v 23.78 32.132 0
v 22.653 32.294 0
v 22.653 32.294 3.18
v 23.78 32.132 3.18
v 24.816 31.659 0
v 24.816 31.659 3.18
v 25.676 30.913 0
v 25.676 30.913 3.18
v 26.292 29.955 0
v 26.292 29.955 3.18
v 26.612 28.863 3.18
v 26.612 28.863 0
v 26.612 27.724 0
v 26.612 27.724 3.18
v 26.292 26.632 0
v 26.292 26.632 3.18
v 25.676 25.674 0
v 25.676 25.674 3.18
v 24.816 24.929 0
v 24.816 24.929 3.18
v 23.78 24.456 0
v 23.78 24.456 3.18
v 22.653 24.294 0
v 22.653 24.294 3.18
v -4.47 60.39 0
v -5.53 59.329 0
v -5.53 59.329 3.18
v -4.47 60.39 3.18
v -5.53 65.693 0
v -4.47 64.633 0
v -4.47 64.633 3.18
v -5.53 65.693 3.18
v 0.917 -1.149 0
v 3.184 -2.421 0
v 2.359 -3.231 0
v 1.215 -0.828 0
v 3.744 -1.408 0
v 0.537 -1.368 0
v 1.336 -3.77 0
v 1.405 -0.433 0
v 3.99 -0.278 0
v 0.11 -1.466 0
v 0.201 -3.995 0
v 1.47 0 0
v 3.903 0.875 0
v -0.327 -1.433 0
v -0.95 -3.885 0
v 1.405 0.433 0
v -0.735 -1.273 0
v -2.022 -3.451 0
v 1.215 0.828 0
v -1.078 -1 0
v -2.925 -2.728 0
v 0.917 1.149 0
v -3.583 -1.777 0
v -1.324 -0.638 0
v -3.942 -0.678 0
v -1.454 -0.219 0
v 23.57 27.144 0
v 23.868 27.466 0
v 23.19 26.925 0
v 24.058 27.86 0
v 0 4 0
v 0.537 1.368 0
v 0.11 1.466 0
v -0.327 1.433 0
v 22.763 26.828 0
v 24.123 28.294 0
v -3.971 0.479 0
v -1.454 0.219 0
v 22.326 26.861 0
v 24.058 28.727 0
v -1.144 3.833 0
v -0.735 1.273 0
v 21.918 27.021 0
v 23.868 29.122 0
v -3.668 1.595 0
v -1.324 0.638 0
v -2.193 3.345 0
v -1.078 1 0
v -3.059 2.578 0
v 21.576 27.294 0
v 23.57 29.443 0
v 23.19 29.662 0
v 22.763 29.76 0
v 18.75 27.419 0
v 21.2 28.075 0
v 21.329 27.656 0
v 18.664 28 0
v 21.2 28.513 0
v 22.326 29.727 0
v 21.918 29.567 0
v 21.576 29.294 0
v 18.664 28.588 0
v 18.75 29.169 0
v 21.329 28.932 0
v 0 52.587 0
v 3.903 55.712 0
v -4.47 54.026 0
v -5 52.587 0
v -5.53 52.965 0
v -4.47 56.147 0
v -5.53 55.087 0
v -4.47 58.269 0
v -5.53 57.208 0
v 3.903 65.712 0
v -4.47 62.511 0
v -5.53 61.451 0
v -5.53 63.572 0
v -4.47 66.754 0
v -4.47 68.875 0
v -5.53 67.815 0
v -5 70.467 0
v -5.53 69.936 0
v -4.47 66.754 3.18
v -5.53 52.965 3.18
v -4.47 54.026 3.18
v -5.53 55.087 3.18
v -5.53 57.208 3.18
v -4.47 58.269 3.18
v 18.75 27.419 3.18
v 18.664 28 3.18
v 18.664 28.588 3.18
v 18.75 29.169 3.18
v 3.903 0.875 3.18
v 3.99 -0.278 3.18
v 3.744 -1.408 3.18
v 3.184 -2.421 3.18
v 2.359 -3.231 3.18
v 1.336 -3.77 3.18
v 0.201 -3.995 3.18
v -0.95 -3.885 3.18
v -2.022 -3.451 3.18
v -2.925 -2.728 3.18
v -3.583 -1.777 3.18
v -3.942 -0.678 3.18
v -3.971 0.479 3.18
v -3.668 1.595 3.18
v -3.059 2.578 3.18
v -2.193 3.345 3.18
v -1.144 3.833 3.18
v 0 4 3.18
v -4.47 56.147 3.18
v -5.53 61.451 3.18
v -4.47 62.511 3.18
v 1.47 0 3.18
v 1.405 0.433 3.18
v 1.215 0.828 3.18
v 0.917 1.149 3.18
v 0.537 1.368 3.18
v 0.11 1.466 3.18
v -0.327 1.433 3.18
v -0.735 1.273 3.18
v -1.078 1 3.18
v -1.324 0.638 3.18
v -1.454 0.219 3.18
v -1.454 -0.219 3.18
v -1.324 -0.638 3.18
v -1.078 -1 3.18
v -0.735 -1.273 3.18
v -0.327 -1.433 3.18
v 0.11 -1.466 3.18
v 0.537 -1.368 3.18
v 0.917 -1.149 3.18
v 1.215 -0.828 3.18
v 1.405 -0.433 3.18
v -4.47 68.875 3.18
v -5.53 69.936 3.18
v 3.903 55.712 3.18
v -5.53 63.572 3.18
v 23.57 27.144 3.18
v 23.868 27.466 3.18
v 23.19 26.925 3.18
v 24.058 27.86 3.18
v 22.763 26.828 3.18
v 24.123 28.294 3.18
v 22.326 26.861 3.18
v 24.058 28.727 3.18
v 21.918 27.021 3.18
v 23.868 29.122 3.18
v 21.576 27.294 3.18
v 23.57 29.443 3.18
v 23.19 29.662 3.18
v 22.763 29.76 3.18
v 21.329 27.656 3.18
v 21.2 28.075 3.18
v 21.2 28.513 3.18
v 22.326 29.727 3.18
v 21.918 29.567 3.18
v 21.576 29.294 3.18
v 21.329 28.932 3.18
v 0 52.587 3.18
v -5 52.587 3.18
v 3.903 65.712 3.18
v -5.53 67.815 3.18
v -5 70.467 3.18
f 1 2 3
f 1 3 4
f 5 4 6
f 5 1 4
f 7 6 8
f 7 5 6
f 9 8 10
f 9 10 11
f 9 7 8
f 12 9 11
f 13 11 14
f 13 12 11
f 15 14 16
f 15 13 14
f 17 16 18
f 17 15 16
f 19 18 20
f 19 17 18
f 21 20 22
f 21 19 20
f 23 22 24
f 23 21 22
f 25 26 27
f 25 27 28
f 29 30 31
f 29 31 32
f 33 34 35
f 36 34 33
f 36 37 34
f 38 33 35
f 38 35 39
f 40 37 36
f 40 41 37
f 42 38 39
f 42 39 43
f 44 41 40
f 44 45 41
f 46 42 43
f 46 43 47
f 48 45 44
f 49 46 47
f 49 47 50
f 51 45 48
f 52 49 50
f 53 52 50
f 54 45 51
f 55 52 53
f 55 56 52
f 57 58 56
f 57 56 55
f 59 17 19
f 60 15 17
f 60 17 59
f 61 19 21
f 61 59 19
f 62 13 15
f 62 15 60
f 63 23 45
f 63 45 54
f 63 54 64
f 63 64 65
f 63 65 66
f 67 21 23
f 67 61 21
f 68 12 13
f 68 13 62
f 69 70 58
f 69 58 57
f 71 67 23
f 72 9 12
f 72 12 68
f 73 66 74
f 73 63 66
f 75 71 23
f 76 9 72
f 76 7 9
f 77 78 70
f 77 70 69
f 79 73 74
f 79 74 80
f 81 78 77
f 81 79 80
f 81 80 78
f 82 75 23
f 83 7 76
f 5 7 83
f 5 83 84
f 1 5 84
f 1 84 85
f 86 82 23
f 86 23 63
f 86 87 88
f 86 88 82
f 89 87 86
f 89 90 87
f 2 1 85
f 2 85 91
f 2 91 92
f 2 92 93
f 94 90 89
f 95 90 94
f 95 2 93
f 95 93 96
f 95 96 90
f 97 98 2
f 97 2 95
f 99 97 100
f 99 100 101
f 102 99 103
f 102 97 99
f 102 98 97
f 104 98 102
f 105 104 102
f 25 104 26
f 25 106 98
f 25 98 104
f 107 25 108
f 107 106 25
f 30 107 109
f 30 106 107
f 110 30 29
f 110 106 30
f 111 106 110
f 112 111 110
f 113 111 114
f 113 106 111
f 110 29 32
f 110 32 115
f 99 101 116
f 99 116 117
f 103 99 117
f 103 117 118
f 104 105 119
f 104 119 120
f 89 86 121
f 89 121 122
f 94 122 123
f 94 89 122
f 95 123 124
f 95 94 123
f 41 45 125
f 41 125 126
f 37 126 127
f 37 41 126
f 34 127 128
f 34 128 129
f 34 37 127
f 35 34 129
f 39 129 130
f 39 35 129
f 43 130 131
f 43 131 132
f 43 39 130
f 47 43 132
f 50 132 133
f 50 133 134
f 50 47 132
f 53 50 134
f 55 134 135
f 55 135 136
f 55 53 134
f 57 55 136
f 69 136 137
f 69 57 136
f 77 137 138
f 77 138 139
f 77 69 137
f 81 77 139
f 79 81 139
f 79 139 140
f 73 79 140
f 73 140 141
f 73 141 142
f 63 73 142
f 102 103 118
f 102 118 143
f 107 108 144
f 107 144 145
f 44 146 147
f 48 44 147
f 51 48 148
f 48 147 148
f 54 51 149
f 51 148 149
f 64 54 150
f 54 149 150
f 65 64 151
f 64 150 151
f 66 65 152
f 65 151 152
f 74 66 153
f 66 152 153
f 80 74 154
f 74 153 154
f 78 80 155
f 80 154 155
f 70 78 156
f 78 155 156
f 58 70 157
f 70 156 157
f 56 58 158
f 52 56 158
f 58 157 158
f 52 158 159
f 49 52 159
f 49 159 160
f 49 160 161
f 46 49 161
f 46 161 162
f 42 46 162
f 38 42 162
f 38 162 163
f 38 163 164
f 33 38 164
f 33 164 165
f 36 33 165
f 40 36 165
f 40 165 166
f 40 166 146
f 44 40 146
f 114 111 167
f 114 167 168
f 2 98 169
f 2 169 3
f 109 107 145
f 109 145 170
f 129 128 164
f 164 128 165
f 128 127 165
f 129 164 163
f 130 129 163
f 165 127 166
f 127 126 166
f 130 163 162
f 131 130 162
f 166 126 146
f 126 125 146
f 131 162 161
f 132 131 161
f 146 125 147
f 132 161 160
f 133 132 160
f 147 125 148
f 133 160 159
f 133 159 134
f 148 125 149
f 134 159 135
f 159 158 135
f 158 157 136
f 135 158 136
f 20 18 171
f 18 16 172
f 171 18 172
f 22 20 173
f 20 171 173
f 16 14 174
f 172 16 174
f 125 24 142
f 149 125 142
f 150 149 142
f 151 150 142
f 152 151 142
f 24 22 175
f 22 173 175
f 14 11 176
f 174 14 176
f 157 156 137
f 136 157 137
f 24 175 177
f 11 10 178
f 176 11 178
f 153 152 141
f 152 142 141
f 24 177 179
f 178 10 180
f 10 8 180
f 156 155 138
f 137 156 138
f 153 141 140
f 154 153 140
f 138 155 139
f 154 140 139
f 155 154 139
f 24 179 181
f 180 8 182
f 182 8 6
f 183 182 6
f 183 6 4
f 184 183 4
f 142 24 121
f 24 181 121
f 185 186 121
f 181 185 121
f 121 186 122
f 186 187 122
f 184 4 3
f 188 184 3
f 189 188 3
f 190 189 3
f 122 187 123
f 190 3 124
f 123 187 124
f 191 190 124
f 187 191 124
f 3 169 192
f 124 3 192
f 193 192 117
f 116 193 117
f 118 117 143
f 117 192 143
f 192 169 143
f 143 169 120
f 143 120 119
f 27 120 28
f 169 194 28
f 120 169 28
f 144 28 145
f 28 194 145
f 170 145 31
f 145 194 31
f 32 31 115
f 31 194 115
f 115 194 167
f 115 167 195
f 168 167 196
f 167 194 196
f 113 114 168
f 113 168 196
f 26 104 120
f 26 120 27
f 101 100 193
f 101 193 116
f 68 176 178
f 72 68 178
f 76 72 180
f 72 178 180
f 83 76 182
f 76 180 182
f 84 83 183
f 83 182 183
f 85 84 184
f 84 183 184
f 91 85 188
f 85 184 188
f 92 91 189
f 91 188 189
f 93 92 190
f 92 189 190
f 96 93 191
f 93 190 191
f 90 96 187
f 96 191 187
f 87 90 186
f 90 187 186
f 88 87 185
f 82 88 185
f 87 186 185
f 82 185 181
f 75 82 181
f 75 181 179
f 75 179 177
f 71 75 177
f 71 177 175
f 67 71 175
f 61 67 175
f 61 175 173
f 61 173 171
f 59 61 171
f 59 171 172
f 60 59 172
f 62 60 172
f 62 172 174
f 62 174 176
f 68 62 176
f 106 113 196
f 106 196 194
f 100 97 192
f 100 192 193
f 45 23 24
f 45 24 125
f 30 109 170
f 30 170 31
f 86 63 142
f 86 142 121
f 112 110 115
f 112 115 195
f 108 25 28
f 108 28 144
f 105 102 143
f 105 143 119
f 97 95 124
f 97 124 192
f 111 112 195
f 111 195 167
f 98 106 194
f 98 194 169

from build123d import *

# Parameters (mm, degrees)
BOSS_EXTRUDE1_DEPTH = 3.18
SKETCH2_R           = 1.47
CUT_EXTRUDE1_DEPTH  = 76.406636354


with BuildPart() as part:
    # Sketch1 → Boss-Extrude1 (new body)
    with BuildSketch(Plane.XY):
        with BuildLine():
            Line((0, 4), (18.75, 27.418742494))
            ThreePointArc((18.75, 27.418742494), (18.653123749, 28.293742494), (18.75, 29.168742494))
            Line((18.75, 29.168742494), (0, 52.587484988))
            Line((0, 52.587484988), (-5, 52.587484988))
            Line((-5, 52.587484988), (-5.530330085, 52.96527181))
            Line((-5.530330085, 52.96527181), (-4.469669914, 54.025931982))
            Line((-4.469669914, 54.025931982), (-5.530330085, 55.086592153))
            Line((-5.530330085, 55.086592153), (-4.469669914, 56.147252325))
            Line((-4.469669914, 56.147252325), (-5.530330086, 57.207912497))
            Line((-5.530330086, 57.207912497), (-4.469669914, 58.268572669))
            Line((-4.469669914, 58.268572669), (-5.530330086, 59.32923284))
            Line((-5.530330086, 59.32923284), (-4.469669914, 60.389893012))
            Line((-4.469669914, 60.389893012), (-5.530330086, 61.450553184))
            Line((-5.530330086, 61.450553184), (-4.469669914, 62.511213356))
            Line((-4.469669914, 62.511213356), (-5.530330086, 63.571873527))
            Line((-5.530330086, 63.571873527), (-4.469669914, 64.632533699))
            Line((-4.469669914, 64.632533699), (-5.530330086, 65.693193871))
            Line((-5.530330086, 65.693193871), (-4.469669914, 66.753854043))
            Line((-4.469669914, 66.753854043), (-5.530330086, 67.814514215))
            Line((-5.530330086, 67.814514215), (-4.469669914, 68.875174386))
            Line((-4.469669914, 68.875174386), (-5.530330086, 69.935834558))
            Line((-5.530330086, 69.935834558), (-5.000000002, 70.467435037))
            Line((-5.000000002, 70.467435037), (3.903123749, 65.712484988))
            Line((3.903123749, 65.712484988), (3.903123749, 55.712484988))
            Line((3.903123749, 55.712484988), (22.653123749, 32.293742494))
            ThreePointArc((22.653123749, 32.293742494), (26.653123749, 28.293742494), (22.653123749, 24.293742494))
            Line((22.653123749, 24.293742494), (3.903123749, 0.875))
            ThreePointArc((3.903123749, 0.875), (-2.5, -3.122498999), (0, 4))
        make_face()
    extrude(amount=BOSS_EXTRUDE1_DEPTH)

    # Sketch2 → Cut-Extrude1 (cut, through all)
    with BuildSketch(Plane.XY.offset(3.18)):
        with Locations((22.653123749, 28.293742494)):
            Circle(SKETCH2_R)
        Circle(SKETCH2_R)
    extrude(amount=-CUT_EXTRUDE1_DEPTH, mode=Mode.SUBTRACT)


solid = part.part
